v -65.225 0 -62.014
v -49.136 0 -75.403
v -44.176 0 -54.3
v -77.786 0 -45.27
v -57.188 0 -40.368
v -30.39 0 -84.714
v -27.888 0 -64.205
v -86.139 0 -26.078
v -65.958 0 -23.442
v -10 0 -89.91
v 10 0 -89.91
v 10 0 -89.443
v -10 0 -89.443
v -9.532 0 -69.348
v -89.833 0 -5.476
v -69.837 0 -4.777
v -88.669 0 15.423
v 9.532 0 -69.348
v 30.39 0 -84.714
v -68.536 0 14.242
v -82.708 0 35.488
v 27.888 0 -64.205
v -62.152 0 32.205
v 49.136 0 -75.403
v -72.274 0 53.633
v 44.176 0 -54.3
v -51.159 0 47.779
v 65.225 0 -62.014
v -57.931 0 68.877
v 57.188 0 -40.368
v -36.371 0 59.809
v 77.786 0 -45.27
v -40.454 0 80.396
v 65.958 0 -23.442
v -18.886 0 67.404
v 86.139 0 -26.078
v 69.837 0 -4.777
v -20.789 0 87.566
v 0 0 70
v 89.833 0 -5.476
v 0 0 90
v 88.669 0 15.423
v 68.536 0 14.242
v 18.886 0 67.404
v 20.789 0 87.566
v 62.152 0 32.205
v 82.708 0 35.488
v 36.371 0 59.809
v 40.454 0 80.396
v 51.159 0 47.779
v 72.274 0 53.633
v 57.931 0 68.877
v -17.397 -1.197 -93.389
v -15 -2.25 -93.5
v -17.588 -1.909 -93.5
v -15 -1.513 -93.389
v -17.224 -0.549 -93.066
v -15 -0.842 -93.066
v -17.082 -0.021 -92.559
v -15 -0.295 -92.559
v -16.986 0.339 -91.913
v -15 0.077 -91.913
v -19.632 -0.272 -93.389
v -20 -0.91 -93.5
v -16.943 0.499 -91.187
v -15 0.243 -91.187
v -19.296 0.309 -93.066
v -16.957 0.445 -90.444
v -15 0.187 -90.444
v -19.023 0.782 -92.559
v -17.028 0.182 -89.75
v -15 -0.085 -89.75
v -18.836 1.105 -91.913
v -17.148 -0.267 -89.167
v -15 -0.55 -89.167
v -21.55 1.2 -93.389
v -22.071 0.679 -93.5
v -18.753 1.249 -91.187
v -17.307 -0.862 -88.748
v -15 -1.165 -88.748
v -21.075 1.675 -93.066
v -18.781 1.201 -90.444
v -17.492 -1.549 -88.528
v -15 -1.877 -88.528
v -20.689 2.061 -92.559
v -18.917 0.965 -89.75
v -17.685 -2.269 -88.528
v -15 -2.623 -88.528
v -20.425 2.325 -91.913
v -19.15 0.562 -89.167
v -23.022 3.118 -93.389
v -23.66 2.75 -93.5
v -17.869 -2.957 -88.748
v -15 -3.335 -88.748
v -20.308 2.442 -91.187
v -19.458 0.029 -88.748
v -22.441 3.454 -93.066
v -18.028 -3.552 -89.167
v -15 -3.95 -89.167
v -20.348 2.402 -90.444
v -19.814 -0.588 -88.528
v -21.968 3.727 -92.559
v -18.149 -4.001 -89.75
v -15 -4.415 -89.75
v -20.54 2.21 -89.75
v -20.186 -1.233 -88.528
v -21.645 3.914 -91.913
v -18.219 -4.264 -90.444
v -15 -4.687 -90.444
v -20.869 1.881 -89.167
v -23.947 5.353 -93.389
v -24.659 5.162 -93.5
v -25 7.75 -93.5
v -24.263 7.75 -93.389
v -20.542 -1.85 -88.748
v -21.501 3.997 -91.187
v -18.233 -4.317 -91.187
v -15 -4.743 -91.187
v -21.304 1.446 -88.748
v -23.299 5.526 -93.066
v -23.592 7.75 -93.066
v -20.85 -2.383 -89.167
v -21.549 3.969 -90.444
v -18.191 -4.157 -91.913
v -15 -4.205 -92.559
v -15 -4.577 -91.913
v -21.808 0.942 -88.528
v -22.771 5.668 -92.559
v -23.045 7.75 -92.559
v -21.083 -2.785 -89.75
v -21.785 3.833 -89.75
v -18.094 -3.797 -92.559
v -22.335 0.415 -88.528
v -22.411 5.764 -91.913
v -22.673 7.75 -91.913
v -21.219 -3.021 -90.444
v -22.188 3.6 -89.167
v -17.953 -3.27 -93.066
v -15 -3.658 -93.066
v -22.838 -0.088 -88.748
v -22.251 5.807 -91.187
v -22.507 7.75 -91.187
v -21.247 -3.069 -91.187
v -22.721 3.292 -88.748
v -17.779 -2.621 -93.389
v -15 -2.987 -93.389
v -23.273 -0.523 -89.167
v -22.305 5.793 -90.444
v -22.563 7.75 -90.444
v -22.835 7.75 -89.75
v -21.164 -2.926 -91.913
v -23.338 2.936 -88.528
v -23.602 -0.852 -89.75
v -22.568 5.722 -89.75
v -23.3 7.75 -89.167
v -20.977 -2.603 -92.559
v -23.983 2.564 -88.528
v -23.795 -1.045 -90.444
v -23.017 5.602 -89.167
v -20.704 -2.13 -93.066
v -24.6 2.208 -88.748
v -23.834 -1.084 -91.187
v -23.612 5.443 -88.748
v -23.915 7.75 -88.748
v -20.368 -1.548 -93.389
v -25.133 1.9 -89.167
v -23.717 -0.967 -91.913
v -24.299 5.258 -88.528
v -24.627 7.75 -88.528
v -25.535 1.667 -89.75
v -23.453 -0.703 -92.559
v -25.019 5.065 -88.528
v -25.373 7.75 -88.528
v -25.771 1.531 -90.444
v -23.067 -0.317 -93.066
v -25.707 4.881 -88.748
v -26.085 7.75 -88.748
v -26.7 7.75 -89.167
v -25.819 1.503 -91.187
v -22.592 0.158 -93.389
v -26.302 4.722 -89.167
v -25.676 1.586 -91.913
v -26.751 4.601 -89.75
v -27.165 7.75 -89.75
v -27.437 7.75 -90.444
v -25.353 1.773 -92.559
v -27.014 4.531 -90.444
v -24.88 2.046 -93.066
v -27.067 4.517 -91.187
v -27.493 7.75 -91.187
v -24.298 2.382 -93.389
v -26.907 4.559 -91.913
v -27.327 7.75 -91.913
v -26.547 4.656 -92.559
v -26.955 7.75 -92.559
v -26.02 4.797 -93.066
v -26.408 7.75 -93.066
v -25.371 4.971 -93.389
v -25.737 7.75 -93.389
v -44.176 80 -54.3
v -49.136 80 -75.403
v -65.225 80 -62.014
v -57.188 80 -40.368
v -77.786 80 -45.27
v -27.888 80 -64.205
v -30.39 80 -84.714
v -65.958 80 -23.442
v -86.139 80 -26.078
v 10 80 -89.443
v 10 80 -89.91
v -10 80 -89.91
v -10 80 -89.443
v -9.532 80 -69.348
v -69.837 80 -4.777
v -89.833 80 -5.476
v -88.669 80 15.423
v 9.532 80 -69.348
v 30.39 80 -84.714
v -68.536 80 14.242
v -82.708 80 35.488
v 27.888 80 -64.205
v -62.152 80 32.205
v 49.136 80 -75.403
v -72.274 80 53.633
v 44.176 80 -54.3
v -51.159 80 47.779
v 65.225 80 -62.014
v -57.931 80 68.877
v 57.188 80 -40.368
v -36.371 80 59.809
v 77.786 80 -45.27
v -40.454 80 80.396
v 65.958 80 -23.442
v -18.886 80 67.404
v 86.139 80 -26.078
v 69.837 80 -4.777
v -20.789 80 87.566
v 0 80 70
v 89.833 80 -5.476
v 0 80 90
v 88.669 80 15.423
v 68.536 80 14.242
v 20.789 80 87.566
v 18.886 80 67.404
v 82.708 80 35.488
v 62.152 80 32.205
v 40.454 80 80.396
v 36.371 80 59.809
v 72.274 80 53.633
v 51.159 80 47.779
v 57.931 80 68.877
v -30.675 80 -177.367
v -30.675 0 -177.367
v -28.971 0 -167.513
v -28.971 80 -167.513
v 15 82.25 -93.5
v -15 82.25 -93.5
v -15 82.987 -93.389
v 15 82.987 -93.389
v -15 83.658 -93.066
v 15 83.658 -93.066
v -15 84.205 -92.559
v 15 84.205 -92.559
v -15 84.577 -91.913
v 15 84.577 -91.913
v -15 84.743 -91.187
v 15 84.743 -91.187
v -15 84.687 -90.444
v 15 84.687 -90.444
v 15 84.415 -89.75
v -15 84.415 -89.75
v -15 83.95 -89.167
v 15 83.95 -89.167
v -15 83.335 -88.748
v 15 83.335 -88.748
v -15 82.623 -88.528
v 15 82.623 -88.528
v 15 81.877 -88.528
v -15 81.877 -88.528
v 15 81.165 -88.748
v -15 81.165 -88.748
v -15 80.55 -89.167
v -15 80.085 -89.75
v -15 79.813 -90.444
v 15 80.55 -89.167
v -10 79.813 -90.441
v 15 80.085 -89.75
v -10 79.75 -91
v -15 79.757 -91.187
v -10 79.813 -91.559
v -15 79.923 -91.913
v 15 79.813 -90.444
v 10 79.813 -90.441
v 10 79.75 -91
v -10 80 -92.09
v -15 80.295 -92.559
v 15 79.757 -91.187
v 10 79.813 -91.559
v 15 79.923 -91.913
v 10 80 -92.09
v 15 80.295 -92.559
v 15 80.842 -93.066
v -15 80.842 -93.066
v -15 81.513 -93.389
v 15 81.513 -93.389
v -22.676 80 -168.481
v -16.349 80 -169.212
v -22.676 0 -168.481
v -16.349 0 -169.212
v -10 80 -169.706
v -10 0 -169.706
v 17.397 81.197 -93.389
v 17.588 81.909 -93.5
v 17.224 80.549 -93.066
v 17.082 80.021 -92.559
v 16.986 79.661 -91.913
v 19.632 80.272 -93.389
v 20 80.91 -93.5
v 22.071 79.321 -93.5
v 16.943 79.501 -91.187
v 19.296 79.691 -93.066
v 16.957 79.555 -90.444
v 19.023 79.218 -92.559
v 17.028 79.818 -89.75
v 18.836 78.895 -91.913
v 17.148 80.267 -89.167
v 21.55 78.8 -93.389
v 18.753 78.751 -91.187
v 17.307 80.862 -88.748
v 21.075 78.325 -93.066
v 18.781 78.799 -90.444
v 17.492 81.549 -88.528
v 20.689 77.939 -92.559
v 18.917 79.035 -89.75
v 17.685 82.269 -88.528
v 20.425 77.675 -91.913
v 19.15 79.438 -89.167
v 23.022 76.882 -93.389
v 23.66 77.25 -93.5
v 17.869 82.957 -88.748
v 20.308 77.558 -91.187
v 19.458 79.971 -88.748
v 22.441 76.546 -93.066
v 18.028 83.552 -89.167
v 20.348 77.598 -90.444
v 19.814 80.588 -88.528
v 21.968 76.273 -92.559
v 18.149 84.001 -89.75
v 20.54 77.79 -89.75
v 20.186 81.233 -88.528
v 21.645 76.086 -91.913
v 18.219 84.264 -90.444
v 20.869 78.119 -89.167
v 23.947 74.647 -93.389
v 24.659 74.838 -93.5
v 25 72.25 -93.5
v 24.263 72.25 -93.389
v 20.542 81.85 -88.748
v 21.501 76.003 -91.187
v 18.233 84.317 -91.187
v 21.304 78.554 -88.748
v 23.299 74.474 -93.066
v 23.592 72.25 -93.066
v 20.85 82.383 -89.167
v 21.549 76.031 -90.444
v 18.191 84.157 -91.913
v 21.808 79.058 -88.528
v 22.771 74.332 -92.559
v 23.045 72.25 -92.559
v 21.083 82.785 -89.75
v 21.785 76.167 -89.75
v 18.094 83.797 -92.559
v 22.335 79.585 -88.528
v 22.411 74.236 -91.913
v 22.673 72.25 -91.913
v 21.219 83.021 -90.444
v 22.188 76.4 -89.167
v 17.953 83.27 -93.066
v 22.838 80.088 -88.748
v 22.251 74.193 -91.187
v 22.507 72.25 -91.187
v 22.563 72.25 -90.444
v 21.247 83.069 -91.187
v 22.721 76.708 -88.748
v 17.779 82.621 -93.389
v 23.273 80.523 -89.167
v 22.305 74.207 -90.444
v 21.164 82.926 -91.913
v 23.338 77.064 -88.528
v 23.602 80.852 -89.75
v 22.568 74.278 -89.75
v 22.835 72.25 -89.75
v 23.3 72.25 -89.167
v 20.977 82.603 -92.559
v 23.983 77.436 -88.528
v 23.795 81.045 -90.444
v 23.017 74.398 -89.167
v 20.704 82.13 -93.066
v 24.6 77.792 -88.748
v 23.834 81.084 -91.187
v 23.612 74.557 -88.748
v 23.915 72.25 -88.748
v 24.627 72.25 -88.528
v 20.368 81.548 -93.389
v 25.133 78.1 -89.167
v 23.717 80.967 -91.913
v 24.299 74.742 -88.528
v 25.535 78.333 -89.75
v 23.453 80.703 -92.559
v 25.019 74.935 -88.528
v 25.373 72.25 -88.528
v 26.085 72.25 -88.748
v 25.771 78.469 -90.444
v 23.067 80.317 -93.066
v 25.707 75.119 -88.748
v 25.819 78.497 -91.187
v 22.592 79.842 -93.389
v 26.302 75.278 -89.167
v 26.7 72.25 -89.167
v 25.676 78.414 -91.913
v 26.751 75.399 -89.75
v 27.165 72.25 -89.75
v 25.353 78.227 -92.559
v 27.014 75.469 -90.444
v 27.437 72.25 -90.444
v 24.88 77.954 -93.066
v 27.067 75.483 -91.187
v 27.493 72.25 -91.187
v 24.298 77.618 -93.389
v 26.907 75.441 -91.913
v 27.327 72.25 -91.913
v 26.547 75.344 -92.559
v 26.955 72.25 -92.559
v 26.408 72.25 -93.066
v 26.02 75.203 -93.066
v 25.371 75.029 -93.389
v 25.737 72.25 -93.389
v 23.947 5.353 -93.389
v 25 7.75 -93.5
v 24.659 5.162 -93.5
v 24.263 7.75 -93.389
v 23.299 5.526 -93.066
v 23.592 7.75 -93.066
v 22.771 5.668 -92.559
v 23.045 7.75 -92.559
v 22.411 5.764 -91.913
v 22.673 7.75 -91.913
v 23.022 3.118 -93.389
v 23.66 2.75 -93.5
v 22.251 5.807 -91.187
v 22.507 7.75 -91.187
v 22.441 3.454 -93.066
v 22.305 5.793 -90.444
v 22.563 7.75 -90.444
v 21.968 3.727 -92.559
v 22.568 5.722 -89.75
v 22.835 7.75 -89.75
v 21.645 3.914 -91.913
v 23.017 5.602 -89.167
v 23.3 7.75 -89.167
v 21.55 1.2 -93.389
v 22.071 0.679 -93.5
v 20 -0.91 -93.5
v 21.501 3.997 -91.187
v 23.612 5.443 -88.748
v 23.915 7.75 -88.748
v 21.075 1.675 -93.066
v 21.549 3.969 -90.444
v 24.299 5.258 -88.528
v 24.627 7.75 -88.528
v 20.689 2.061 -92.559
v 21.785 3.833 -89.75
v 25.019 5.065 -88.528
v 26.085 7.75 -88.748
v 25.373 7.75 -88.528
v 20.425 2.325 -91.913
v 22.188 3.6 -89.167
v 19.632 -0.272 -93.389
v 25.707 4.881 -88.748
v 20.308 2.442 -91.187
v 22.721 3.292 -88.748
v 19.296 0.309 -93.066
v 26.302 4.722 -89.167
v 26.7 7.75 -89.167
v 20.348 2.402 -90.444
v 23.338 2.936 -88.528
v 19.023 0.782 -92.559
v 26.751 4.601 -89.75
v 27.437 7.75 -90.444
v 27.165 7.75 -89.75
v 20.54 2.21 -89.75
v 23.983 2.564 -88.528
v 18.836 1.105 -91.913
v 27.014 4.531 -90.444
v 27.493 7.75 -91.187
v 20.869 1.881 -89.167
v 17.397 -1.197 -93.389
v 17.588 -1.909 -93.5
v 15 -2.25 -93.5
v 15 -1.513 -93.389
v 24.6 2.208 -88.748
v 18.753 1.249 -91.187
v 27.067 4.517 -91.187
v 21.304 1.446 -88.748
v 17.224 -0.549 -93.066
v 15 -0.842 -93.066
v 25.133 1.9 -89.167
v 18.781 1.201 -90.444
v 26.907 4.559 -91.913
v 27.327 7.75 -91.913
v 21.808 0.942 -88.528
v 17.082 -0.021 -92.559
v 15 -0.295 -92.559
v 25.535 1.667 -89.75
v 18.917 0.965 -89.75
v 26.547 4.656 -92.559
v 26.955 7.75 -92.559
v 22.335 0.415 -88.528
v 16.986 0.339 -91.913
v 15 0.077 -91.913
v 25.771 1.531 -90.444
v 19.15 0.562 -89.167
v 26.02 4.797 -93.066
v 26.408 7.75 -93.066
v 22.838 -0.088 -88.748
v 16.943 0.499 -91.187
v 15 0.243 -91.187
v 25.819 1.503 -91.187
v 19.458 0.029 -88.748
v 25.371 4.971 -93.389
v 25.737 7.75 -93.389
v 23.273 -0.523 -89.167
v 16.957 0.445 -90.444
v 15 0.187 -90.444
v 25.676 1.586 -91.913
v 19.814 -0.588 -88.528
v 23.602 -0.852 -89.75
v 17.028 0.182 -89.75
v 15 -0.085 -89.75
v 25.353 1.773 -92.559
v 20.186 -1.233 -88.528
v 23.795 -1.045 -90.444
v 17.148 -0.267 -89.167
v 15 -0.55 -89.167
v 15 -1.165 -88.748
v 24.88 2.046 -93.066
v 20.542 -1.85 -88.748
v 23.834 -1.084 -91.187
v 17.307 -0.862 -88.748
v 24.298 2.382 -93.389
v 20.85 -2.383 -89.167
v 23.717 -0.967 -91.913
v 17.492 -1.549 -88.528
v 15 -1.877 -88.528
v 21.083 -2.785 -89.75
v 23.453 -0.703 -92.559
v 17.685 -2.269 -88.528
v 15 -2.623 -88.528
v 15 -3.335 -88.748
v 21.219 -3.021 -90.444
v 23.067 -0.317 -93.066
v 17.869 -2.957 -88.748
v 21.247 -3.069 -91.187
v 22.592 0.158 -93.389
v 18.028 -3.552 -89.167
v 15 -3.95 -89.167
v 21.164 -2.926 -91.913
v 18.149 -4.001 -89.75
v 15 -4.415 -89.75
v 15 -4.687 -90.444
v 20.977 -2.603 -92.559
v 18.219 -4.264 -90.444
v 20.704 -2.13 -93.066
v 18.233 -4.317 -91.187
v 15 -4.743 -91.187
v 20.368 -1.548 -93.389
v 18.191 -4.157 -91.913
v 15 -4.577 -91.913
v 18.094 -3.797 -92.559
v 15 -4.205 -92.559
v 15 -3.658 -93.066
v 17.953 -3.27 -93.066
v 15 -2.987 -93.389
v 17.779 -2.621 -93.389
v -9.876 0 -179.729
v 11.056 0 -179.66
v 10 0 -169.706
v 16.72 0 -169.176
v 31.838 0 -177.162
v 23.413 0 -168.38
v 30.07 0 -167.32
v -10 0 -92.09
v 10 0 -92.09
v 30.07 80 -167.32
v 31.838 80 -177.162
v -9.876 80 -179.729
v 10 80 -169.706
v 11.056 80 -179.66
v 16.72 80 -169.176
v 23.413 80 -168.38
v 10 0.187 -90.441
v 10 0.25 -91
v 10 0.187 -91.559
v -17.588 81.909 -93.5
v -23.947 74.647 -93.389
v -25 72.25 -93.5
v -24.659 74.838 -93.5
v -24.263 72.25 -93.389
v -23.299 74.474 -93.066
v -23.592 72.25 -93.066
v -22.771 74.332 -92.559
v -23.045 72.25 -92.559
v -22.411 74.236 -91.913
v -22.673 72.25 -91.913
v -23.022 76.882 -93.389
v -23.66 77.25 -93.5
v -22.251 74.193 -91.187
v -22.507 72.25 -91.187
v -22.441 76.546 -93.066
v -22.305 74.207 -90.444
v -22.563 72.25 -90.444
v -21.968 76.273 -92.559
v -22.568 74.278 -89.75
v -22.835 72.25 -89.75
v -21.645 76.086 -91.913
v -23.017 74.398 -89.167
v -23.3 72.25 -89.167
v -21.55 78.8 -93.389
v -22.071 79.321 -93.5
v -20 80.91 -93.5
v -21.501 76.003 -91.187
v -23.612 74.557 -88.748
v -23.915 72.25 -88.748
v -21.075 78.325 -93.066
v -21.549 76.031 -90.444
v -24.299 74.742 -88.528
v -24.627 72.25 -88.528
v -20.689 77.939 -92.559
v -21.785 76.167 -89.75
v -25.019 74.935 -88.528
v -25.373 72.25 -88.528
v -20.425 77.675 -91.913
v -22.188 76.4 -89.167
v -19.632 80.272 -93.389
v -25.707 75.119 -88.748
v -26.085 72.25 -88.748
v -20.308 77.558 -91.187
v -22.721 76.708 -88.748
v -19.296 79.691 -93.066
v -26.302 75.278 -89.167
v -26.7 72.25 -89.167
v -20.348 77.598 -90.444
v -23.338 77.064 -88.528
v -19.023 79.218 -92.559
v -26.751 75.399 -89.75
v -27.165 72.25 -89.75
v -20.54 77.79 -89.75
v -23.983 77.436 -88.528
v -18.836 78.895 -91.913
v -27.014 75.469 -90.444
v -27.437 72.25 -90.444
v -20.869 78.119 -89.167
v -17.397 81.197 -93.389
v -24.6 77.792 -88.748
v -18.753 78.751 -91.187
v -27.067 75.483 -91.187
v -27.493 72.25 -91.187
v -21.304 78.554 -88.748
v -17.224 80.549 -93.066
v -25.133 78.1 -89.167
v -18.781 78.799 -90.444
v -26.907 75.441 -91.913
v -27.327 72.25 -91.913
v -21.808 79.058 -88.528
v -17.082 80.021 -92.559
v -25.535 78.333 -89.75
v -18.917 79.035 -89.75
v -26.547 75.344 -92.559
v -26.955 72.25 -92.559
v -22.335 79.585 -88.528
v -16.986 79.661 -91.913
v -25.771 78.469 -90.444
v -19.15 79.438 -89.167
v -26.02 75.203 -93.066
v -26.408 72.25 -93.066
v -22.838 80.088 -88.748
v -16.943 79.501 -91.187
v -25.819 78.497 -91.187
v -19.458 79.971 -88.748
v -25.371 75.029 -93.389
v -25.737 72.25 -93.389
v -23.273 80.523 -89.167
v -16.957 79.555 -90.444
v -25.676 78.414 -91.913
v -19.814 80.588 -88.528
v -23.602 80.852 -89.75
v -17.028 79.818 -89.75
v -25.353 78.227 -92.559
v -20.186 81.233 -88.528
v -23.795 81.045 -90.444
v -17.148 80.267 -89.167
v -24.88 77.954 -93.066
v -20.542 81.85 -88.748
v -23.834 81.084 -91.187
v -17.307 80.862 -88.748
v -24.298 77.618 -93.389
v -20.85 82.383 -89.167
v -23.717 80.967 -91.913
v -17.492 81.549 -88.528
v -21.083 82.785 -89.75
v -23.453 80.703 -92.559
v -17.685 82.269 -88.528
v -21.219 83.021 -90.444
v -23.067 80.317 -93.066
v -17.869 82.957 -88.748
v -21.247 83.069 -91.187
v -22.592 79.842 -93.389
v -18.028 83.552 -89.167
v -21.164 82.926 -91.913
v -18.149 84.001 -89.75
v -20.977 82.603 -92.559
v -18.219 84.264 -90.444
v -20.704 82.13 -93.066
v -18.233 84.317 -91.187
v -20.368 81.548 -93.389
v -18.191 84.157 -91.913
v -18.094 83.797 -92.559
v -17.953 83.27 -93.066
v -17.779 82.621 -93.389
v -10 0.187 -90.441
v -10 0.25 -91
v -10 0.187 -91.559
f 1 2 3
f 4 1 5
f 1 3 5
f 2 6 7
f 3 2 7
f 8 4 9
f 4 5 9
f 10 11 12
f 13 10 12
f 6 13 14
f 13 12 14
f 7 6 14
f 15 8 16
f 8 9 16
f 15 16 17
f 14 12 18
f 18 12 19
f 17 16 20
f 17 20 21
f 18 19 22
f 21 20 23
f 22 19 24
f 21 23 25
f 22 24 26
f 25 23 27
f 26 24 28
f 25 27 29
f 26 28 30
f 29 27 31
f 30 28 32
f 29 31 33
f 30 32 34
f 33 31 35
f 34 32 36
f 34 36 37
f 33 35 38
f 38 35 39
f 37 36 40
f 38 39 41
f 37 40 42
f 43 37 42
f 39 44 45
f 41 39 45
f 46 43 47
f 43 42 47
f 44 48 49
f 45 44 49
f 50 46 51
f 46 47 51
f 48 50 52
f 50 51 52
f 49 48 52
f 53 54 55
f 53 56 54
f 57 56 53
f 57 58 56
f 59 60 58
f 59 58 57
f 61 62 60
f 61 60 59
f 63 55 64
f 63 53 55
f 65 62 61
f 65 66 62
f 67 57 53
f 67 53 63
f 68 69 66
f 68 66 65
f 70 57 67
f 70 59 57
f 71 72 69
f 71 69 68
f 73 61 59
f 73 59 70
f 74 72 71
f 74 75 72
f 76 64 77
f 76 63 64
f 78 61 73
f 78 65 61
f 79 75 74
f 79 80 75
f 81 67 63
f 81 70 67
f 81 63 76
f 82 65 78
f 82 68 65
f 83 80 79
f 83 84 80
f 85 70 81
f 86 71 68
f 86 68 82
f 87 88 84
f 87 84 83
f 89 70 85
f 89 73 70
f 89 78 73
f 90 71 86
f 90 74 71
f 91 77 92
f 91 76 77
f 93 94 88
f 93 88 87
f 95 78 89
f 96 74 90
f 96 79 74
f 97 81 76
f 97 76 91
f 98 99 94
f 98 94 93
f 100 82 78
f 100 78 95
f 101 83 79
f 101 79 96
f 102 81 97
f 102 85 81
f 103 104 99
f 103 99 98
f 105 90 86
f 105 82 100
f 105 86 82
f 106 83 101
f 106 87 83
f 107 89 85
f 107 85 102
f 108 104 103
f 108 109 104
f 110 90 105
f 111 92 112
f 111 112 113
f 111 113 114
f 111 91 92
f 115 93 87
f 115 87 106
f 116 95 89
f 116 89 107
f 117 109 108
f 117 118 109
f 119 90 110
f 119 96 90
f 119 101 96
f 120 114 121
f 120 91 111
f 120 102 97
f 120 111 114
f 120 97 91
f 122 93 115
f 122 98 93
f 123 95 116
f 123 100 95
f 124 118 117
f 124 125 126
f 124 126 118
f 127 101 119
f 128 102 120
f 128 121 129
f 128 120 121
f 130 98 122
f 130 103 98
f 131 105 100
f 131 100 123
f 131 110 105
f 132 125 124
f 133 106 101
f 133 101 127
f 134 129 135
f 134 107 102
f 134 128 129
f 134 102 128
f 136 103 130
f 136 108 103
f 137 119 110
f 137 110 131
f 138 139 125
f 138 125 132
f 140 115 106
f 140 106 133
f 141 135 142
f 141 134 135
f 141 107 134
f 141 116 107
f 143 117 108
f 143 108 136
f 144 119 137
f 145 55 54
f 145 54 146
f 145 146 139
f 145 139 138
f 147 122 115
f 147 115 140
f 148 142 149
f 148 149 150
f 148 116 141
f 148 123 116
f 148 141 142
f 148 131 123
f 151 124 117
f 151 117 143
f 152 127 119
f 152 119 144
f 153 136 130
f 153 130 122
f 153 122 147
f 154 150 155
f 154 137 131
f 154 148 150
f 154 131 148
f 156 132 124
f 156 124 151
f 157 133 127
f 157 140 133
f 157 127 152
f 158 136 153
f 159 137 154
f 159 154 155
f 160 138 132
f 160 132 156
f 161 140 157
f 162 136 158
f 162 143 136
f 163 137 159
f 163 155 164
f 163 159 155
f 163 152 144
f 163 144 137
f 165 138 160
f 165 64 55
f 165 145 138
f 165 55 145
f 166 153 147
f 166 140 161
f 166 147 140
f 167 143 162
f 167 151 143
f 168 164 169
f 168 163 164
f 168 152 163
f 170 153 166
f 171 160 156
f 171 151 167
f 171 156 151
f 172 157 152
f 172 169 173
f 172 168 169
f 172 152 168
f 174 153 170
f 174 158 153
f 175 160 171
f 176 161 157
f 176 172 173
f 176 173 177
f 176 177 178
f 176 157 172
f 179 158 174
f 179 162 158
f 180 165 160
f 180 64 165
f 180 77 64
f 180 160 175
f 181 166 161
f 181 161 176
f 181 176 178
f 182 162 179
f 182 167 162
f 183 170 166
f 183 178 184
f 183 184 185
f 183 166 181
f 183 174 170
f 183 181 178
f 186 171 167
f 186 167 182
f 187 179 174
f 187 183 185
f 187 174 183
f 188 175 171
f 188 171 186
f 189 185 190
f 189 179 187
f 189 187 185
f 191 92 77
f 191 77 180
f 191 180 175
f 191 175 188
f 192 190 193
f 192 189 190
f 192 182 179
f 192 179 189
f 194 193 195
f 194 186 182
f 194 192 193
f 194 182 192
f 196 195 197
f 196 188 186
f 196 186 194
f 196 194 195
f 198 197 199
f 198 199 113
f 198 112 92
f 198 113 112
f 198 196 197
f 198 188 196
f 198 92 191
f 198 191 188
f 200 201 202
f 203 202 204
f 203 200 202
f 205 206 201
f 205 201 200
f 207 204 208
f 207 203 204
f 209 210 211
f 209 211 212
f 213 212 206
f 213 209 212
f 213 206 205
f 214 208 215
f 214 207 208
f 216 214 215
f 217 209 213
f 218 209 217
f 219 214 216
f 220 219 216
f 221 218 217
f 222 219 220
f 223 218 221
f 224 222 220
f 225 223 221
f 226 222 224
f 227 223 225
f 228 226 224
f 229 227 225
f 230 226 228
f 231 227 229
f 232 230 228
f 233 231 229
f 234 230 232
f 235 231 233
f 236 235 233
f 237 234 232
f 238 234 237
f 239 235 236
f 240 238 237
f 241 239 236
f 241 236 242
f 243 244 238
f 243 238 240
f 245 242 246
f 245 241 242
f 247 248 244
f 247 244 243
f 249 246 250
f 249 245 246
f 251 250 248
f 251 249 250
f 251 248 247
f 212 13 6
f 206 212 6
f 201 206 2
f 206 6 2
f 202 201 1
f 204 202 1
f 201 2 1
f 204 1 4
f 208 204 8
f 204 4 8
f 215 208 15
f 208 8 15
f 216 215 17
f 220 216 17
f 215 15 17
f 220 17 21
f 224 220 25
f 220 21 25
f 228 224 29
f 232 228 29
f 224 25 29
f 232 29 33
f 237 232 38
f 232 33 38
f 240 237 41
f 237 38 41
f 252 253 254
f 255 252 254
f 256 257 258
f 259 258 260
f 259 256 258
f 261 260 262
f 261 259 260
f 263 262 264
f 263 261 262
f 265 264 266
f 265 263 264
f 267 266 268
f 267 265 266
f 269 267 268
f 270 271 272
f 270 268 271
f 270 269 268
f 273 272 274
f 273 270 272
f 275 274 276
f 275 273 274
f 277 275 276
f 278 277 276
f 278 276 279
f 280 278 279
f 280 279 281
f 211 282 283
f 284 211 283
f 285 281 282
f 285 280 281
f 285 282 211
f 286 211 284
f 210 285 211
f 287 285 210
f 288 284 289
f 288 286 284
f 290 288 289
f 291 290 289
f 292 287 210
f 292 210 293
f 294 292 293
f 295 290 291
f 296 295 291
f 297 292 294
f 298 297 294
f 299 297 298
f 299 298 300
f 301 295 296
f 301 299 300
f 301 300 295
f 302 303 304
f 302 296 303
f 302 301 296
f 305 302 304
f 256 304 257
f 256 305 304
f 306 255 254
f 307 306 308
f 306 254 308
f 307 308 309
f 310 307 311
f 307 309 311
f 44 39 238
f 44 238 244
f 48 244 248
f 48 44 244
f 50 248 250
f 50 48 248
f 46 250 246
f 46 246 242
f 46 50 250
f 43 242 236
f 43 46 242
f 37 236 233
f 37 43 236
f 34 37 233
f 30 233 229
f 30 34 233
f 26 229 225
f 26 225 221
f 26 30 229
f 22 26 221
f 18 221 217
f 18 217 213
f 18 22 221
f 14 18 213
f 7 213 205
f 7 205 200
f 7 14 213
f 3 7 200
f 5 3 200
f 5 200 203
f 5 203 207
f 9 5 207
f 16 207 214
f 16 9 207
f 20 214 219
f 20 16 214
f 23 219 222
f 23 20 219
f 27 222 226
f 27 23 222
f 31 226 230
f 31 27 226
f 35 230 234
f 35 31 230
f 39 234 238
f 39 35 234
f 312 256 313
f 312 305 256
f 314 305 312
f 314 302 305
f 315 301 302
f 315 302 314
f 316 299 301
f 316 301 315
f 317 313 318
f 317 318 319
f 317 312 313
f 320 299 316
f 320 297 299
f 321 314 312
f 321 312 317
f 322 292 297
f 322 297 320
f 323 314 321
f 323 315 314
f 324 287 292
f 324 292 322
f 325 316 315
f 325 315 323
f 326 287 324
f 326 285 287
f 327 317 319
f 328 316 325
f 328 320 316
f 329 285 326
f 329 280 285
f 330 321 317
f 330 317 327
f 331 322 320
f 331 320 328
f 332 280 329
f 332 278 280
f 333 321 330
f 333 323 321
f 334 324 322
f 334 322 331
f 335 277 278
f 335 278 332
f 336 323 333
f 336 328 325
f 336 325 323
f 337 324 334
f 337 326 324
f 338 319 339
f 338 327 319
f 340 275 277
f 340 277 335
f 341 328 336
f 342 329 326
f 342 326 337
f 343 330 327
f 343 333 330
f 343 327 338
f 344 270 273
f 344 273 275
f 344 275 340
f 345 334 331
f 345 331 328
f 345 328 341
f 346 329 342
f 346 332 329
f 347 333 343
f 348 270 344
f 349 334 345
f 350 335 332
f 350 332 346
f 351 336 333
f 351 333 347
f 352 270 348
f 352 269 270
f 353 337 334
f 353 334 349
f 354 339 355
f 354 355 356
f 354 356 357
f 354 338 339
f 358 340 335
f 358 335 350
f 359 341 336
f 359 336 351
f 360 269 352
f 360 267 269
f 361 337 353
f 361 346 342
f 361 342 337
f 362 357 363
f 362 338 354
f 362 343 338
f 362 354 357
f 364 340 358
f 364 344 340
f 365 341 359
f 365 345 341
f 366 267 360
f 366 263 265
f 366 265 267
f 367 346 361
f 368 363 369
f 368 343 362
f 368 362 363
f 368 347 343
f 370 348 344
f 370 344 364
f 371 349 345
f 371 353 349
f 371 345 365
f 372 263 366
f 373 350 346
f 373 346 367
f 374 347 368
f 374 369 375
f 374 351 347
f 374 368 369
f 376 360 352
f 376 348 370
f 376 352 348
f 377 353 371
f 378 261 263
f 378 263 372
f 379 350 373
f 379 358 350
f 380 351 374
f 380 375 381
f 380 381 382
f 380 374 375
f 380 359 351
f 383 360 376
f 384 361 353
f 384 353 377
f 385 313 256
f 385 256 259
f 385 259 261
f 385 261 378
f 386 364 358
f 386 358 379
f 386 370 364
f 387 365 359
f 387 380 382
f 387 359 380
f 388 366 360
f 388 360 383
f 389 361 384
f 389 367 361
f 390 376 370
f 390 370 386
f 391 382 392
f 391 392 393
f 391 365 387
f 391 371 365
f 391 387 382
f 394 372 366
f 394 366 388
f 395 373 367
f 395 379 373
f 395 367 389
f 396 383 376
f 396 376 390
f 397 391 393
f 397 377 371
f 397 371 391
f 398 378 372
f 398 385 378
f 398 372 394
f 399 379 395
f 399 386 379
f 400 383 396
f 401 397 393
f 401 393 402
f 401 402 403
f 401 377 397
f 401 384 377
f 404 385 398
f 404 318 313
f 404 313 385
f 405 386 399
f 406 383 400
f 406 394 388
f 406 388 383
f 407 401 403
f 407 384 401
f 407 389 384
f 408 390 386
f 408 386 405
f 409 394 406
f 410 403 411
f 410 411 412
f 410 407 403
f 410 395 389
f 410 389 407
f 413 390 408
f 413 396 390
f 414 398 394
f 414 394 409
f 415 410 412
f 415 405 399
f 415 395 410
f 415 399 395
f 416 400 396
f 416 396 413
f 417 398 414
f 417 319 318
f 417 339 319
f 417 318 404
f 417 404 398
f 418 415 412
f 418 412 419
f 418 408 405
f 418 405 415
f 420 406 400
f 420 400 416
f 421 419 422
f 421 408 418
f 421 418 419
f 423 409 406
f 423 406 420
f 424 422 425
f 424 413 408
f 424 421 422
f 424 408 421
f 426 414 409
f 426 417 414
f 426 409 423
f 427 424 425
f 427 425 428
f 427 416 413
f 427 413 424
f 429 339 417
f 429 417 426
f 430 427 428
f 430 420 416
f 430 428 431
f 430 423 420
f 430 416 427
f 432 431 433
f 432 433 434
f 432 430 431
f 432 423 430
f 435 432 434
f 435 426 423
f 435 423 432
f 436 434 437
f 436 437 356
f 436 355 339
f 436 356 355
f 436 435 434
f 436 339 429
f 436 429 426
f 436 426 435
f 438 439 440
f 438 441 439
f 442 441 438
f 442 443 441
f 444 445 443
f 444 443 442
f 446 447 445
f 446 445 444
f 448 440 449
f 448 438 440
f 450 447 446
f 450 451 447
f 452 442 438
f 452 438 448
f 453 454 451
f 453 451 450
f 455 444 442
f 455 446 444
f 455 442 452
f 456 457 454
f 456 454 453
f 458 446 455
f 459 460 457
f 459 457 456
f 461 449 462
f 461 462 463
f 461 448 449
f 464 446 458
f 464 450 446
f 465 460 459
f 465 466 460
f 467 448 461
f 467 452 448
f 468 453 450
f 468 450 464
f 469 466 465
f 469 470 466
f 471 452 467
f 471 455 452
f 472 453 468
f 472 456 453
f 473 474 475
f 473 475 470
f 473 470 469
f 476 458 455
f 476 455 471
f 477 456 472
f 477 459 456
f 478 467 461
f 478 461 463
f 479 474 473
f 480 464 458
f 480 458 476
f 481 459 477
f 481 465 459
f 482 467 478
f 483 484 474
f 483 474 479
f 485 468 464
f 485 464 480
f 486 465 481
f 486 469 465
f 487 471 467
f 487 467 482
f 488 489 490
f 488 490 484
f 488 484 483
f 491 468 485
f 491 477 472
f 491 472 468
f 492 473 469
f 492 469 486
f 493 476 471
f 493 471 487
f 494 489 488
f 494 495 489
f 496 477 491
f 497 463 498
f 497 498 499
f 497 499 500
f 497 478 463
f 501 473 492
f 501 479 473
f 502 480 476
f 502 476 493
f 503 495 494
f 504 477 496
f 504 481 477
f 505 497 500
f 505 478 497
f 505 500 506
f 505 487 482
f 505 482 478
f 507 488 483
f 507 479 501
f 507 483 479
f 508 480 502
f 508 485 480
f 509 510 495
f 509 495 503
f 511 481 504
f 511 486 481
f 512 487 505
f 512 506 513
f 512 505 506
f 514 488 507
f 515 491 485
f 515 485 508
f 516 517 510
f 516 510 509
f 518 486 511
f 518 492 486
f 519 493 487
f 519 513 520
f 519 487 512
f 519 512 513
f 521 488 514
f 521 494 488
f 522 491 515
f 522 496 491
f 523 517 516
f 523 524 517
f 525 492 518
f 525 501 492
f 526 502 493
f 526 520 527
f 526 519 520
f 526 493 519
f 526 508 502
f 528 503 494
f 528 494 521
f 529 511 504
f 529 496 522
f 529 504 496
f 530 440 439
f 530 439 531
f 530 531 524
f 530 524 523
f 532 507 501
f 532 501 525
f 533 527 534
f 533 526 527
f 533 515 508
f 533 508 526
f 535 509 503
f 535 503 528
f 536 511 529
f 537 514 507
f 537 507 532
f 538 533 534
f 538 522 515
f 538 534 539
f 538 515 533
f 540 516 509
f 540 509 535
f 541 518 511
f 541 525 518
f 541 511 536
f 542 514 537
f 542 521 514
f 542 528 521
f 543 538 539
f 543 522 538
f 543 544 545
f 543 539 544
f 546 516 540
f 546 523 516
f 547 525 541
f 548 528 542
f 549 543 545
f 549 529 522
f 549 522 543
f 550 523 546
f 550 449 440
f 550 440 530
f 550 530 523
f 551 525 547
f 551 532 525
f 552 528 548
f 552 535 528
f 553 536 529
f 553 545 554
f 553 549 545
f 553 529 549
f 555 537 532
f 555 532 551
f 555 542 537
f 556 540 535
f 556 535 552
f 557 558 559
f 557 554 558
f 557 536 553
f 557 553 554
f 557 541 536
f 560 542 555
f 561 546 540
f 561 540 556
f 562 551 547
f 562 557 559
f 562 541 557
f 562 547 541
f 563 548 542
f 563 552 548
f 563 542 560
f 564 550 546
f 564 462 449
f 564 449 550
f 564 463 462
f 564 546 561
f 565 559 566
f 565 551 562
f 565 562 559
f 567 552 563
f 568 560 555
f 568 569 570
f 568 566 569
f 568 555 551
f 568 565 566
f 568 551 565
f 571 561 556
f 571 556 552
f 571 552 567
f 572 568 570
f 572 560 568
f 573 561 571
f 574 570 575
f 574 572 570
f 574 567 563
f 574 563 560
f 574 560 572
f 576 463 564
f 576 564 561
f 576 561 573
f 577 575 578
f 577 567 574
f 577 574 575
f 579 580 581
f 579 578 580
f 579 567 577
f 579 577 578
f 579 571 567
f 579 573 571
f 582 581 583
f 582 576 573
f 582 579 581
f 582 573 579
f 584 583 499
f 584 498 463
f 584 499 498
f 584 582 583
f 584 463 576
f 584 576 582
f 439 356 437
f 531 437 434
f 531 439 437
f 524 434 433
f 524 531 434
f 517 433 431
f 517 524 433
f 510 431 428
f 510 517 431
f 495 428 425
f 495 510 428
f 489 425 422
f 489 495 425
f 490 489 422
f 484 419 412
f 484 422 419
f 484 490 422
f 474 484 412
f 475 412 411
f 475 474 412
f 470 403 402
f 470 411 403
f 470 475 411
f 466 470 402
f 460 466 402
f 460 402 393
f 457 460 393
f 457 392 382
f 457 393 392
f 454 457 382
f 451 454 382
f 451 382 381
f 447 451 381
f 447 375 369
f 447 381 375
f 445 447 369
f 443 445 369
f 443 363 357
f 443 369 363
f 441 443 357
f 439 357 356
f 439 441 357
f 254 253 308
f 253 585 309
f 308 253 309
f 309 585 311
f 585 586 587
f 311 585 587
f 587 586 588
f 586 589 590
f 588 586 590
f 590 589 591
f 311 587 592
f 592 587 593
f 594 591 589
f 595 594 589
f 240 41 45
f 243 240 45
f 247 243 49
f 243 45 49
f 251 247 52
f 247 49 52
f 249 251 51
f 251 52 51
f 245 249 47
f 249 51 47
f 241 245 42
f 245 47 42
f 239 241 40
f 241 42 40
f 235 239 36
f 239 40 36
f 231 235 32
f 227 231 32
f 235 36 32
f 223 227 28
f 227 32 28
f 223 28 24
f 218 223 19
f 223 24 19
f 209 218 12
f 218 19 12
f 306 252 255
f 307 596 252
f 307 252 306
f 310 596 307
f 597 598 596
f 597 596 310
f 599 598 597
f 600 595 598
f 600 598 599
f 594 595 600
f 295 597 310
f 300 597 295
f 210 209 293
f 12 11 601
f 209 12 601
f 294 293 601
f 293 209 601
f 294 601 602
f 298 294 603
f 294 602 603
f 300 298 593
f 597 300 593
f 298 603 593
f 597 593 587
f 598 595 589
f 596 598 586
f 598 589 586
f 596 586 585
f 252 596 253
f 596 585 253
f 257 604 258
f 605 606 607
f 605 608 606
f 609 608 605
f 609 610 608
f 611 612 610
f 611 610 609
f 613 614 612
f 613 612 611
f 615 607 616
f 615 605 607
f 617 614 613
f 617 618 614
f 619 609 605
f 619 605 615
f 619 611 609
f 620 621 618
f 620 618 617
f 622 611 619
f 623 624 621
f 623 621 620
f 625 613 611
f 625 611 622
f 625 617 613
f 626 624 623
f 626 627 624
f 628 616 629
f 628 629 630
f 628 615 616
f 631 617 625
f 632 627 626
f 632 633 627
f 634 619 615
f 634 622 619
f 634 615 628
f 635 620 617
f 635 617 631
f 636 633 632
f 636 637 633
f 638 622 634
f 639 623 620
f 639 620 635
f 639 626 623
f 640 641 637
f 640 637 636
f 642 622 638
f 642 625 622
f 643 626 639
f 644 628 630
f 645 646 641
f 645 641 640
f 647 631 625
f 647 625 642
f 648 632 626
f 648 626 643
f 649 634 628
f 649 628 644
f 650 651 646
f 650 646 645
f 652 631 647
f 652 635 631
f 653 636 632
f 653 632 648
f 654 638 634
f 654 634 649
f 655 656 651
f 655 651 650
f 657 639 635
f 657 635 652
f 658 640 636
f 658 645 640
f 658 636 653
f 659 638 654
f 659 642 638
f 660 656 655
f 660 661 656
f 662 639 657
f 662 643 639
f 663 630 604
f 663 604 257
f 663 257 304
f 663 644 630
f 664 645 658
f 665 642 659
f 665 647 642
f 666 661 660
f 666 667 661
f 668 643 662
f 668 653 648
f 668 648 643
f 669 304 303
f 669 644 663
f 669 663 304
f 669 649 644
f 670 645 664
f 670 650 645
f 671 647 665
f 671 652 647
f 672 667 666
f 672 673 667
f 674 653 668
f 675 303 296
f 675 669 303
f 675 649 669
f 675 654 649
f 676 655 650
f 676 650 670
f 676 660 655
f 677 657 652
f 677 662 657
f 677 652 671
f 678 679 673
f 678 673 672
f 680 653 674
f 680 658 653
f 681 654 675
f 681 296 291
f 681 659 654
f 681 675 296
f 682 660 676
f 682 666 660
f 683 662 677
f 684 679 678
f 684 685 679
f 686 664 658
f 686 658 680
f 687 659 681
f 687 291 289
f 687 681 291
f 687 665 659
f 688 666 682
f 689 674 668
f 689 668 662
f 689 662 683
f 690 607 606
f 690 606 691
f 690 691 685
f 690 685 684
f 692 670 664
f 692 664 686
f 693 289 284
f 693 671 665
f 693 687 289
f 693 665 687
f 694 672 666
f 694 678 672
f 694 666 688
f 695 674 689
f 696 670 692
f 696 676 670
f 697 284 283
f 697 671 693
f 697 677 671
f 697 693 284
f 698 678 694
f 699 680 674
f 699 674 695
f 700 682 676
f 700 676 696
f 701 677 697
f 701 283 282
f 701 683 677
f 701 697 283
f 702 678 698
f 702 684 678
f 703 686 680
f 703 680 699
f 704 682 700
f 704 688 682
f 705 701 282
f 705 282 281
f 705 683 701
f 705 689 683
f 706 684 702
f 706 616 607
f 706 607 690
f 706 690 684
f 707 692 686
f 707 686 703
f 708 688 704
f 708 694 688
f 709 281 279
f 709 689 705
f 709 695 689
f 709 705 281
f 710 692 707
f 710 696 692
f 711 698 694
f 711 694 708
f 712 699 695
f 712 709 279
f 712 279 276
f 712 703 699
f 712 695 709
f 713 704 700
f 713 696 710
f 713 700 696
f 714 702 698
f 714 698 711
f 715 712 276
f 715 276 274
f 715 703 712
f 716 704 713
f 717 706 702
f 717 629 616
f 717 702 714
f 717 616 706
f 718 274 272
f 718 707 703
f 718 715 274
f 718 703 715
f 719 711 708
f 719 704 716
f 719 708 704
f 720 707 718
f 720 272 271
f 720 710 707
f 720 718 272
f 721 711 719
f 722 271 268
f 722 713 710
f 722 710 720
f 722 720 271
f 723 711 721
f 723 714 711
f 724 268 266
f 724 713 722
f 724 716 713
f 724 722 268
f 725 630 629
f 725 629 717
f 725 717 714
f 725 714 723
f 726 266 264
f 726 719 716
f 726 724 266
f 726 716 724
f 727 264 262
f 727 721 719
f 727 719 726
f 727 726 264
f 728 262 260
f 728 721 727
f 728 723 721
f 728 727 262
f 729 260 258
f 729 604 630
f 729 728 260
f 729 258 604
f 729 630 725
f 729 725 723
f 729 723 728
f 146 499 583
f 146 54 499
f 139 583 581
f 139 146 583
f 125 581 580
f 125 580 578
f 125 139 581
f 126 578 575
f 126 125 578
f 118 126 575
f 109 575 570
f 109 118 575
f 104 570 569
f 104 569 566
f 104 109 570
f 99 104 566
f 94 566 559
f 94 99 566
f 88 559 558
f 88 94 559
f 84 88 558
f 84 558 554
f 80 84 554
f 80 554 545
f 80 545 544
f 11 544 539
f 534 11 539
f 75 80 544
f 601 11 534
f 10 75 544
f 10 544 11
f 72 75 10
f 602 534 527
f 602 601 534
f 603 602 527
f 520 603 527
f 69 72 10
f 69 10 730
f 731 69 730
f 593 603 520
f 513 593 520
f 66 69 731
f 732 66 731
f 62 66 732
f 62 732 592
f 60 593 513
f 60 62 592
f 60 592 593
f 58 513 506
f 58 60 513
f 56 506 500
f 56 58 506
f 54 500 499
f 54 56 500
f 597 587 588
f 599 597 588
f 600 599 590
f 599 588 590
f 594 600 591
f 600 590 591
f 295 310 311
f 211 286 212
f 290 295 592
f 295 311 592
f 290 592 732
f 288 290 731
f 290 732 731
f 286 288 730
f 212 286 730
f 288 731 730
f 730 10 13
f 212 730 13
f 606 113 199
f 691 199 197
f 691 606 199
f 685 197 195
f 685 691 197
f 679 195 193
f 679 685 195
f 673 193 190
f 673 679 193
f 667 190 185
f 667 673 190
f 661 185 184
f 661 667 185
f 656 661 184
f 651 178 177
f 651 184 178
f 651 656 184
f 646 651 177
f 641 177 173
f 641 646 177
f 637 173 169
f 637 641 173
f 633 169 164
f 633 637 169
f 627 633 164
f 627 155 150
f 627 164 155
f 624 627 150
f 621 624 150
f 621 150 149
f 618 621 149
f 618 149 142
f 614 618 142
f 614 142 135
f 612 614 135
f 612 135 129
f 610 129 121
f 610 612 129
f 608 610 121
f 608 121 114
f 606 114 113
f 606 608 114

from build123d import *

# Parameters (mm, degrees)
SKETCH1_R           = 70
BOSS_EXTRUDE1_DEPTH = 80
BOSS_EXTRUDE2_DEPTH = 80
SKETCH3_R           = 2.5


with BuildPart() as part:
    # Sketch1 → Boss-Extrude1 (new body)
    with BuildSketch(Plane(origin=(0, 0, 0), x_dir=(1, 0, 0), z_dir=(0, 1, 0))):
        with BuildLine():
            ThreePointArc((10, 89.4427191), (0, 90), (-10, 89.4427191))
            ThreePointArc((-10, 89.4427191), (-60, -67.082039325), (90, 0))
            ThreePointArc((90, 0), (67.082039325, 60), (10, 89.4427191))
        make_face()
        Circle(SKETCH1_R, mode=Mode.SUBTRACT)
    extrude(amount=BOSS_EXTRUDE1_DEPTH)

    # Sketch1<3> → Boss-Extrude2 (add)
    with BuildSketch(Plane(origin=(0, 0, 0), x_dir=(1, 0, 0), z_dir=(0, 1, 0))):
        with BuildLine():
            ThreePointArc((31.838312344, 177.161852178), (0.590784056, 179.999030481), (-30.674694906, 177.367029327))
            Line((-30.674694906, 177.367029327), (-28.970545189, 167.513305476))
            ThreePointArc((-28.970545189, 167.513305476), (-19.516080985, 168.876056867), (-10, 169.705627485))
            Line((-10, 169.705627485), (-10, 89.4427191))
            ThreePointArc((-10, 89.4427191), (0, 90), (10, 89.4427191))
            Line((10, 89.4427191), (10, 169.705627485))
            ThreePointArc((10, 169.705627485), (20.070249656, 168.811092878), (30.069517214, 167.319527057))
            Line((30.069517214, 167.319527057), (31.838312344, 177.161852178))
        make_face()
    extrude(amount=BOSS_EXTRUDE2_DEPTH)

    # Sweep1: sweep along a path in Sketch2
    with BuildLine(Plane.XY.offset(-91)) as sweep1_path:
        Line((15, -2.25), (-15, -2.25))
        ThreePointArc((-15, -2.25), (-22.071067812, 0.678932188), (-25, 7.75))
        Line((-25, 7.75), (-25, 72.25))
        ThreePointArc((-25, 72.25), (-22.071067812, 79.321067812), (-15, 82.25))
        Line((-15, 82.25), (15, 82.25))
        ThreePointArc((15, 82.25), (22.071067812, 79.321067812), (25, 72.25))
        Line((25, 72.25), (25, 7.75))
        ThreePointArc((25, 7.75), (22.071067812, 0.678932188), (15, -2.25))
    # Sketch3 → Sweep1 (sweep)
    with BuildSketch(Plane(origin=(0, 0, 0), x_dir=(0, 0, -1), z_dir=(1, 0, 0))):
        with Locations((91, 82.25)):
            Circle(SKETCH3_R)
    sweep(path=sweep1_path.line)


solid = part.part
